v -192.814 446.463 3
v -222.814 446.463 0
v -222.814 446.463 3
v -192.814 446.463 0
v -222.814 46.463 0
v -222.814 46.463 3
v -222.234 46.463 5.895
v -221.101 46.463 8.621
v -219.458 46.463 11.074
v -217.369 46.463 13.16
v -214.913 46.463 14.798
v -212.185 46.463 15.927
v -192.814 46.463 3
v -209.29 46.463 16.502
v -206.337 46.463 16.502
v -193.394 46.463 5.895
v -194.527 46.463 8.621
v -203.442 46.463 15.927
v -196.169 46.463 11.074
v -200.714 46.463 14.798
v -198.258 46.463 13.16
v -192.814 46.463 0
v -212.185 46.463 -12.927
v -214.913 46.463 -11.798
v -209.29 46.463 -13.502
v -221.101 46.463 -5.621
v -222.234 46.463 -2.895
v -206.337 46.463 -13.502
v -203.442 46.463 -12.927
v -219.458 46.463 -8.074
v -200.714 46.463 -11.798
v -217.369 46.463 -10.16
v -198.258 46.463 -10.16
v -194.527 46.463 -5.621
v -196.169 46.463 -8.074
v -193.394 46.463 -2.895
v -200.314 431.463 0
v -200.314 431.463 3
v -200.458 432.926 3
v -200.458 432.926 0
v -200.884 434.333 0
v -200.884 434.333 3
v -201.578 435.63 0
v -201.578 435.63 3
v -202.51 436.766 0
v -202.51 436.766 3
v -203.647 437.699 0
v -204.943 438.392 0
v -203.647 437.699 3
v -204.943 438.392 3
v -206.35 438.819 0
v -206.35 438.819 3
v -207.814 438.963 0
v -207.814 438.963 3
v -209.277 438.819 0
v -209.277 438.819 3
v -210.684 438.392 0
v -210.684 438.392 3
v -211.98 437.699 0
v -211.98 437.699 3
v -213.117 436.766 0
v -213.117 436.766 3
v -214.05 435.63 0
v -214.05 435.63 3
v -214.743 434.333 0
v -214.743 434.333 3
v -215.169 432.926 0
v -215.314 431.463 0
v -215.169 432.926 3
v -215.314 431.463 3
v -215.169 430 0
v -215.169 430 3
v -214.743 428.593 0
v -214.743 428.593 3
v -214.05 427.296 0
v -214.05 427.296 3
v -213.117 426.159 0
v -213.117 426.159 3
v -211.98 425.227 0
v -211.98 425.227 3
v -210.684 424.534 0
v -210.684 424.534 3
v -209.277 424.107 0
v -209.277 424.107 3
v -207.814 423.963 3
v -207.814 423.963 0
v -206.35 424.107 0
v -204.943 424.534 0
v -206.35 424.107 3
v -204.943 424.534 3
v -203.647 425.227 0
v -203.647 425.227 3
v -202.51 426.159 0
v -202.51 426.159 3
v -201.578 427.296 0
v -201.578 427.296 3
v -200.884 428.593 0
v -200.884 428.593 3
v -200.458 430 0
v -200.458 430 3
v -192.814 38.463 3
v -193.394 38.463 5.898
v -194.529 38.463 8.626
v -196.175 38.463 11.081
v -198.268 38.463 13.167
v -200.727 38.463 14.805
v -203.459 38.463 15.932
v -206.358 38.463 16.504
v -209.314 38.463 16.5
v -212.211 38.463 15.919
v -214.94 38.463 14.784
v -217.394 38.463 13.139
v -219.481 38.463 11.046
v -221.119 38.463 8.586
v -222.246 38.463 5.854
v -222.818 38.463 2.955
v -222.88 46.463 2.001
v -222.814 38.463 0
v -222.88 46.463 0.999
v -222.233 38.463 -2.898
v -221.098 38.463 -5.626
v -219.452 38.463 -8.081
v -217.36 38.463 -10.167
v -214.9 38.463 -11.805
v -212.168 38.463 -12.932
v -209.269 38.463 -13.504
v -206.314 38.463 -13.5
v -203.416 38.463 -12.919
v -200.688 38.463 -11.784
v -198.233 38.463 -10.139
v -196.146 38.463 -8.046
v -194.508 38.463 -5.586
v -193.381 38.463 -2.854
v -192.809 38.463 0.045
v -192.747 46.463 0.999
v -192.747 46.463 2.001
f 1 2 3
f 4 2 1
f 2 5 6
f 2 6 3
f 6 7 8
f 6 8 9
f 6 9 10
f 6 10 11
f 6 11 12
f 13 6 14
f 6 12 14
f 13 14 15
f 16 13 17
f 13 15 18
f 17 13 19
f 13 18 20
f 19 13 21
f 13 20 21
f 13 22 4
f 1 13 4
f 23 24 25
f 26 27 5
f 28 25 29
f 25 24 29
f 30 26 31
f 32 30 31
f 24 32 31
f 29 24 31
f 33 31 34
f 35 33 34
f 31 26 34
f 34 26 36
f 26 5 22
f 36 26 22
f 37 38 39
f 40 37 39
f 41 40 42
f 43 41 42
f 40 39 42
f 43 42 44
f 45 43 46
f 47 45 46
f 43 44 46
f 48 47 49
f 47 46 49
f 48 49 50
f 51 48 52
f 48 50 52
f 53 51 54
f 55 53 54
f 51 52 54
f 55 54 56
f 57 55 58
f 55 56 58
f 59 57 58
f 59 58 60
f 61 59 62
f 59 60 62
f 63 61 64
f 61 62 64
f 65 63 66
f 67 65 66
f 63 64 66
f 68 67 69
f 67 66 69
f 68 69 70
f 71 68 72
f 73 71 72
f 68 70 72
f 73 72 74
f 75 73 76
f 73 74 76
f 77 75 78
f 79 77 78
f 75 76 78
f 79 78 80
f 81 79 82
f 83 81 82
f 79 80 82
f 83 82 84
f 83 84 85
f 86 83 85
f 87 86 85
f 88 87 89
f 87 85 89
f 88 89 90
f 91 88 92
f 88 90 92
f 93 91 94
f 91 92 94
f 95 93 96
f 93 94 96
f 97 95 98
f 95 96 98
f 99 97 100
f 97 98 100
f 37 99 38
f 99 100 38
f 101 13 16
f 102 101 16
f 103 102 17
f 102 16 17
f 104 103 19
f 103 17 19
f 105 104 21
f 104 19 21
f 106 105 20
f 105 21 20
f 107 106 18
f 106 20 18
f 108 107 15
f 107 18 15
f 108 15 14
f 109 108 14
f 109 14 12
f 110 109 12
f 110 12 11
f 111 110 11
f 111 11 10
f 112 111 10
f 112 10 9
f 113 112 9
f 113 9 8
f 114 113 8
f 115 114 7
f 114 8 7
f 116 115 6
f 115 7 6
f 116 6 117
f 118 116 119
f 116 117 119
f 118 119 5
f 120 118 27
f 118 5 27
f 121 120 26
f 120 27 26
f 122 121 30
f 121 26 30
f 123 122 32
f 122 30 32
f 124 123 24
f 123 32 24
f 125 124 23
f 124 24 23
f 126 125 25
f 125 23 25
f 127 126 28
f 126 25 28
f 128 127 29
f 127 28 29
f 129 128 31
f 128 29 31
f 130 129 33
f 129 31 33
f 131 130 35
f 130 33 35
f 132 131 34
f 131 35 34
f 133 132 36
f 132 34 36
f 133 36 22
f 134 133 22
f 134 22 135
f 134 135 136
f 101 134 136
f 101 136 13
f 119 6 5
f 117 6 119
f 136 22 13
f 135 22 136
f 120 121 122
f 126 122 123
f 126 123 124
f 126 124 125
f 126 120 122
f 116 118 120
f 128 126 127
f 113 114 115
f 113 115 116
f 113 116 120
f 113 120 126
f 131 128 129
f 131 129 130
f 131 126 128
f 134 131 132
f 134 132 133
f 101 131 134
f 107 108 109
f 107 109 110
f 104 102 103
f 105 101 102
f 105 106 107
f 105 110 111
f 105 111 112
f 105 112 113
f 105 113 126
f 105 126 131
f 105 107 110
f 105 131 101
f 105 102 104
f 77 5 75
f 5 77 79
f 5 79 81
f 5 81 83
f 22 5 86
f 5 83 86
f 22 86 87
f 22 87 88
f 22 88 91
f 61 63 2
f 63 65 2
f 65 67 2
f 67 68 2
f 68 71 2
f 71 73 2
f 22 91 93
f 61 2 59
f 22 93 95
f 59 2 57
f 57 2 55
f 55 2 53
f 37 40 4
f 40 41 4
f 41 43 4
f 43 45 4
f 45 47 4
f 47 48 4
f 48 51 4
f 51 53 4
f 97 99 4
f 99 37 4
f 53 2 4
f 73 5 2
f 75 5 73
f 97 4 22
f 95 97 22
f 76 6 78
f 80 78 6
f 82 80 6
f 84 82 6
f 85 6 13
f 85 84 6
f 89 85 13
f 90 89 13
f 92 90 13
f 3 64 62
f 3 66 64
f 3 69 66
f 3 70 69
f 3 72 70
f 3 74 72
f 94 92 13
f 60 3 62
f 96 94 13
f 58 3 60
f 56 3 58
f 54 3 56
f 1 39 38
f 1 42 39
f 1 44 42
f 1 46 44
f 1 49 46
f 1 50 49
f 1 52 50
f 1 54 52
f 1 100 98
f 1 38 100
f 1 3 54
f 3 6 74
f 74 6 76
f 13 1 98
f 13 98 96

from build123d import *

# Parameters (mm, degrees)
SZKIC1_W                    = 30
SZKIC1_H                    = 400
DODANIE_WYCI_GNI_CIE1_DEPTH = 3
SZKIC2_R                    = 7.5
WYTNIJ_WYCI_GNI_CIE1_DEPTH  = 3
SZKIC3_R                    = 15.074813432
DODANIE_WYCI_GNI_CIE2_DEPTH = 8


with BuildPart() as part:
    # Szkic1 → Dodanie-wyciągnięcie1 (new body)
    with BuildSketch(Plane.XY):
        with Locations((-207.813580858, 246.462746709)):
            Rectangle(SZKIC1_W, SZKIC1_H)
    extrude(amount=DODANIE_WYCI_GNI_CIE1_DEPTH)

    # Szkic2 → Wytnij-wyciągnięcie1 (cut)
    with BuildSketch(Plane.XY.offset(3)):
        with Locations((-207.813580858, 431.462746709)):
            Circle(SZKIC2_R)
    extrude(amount=-WYTNIJ_WYCI_GNI_CIE1_DEPTH, mode=Mode.SUBTRACT)

    # Szkic3 → Dodanie-wyciągnięcie2 (add)
    with BuildSketch(Plane.XZ.offset(-46.462746709)):
        with Locations(Location((-207.813580858, 1.5, 0), (0, 0, 5.710593137))):
            Circle(SZKIC3_R)
    extrude(amount=DODANIE_WYCI_GNI_CIE2_DEPTH)


solid = part.part
